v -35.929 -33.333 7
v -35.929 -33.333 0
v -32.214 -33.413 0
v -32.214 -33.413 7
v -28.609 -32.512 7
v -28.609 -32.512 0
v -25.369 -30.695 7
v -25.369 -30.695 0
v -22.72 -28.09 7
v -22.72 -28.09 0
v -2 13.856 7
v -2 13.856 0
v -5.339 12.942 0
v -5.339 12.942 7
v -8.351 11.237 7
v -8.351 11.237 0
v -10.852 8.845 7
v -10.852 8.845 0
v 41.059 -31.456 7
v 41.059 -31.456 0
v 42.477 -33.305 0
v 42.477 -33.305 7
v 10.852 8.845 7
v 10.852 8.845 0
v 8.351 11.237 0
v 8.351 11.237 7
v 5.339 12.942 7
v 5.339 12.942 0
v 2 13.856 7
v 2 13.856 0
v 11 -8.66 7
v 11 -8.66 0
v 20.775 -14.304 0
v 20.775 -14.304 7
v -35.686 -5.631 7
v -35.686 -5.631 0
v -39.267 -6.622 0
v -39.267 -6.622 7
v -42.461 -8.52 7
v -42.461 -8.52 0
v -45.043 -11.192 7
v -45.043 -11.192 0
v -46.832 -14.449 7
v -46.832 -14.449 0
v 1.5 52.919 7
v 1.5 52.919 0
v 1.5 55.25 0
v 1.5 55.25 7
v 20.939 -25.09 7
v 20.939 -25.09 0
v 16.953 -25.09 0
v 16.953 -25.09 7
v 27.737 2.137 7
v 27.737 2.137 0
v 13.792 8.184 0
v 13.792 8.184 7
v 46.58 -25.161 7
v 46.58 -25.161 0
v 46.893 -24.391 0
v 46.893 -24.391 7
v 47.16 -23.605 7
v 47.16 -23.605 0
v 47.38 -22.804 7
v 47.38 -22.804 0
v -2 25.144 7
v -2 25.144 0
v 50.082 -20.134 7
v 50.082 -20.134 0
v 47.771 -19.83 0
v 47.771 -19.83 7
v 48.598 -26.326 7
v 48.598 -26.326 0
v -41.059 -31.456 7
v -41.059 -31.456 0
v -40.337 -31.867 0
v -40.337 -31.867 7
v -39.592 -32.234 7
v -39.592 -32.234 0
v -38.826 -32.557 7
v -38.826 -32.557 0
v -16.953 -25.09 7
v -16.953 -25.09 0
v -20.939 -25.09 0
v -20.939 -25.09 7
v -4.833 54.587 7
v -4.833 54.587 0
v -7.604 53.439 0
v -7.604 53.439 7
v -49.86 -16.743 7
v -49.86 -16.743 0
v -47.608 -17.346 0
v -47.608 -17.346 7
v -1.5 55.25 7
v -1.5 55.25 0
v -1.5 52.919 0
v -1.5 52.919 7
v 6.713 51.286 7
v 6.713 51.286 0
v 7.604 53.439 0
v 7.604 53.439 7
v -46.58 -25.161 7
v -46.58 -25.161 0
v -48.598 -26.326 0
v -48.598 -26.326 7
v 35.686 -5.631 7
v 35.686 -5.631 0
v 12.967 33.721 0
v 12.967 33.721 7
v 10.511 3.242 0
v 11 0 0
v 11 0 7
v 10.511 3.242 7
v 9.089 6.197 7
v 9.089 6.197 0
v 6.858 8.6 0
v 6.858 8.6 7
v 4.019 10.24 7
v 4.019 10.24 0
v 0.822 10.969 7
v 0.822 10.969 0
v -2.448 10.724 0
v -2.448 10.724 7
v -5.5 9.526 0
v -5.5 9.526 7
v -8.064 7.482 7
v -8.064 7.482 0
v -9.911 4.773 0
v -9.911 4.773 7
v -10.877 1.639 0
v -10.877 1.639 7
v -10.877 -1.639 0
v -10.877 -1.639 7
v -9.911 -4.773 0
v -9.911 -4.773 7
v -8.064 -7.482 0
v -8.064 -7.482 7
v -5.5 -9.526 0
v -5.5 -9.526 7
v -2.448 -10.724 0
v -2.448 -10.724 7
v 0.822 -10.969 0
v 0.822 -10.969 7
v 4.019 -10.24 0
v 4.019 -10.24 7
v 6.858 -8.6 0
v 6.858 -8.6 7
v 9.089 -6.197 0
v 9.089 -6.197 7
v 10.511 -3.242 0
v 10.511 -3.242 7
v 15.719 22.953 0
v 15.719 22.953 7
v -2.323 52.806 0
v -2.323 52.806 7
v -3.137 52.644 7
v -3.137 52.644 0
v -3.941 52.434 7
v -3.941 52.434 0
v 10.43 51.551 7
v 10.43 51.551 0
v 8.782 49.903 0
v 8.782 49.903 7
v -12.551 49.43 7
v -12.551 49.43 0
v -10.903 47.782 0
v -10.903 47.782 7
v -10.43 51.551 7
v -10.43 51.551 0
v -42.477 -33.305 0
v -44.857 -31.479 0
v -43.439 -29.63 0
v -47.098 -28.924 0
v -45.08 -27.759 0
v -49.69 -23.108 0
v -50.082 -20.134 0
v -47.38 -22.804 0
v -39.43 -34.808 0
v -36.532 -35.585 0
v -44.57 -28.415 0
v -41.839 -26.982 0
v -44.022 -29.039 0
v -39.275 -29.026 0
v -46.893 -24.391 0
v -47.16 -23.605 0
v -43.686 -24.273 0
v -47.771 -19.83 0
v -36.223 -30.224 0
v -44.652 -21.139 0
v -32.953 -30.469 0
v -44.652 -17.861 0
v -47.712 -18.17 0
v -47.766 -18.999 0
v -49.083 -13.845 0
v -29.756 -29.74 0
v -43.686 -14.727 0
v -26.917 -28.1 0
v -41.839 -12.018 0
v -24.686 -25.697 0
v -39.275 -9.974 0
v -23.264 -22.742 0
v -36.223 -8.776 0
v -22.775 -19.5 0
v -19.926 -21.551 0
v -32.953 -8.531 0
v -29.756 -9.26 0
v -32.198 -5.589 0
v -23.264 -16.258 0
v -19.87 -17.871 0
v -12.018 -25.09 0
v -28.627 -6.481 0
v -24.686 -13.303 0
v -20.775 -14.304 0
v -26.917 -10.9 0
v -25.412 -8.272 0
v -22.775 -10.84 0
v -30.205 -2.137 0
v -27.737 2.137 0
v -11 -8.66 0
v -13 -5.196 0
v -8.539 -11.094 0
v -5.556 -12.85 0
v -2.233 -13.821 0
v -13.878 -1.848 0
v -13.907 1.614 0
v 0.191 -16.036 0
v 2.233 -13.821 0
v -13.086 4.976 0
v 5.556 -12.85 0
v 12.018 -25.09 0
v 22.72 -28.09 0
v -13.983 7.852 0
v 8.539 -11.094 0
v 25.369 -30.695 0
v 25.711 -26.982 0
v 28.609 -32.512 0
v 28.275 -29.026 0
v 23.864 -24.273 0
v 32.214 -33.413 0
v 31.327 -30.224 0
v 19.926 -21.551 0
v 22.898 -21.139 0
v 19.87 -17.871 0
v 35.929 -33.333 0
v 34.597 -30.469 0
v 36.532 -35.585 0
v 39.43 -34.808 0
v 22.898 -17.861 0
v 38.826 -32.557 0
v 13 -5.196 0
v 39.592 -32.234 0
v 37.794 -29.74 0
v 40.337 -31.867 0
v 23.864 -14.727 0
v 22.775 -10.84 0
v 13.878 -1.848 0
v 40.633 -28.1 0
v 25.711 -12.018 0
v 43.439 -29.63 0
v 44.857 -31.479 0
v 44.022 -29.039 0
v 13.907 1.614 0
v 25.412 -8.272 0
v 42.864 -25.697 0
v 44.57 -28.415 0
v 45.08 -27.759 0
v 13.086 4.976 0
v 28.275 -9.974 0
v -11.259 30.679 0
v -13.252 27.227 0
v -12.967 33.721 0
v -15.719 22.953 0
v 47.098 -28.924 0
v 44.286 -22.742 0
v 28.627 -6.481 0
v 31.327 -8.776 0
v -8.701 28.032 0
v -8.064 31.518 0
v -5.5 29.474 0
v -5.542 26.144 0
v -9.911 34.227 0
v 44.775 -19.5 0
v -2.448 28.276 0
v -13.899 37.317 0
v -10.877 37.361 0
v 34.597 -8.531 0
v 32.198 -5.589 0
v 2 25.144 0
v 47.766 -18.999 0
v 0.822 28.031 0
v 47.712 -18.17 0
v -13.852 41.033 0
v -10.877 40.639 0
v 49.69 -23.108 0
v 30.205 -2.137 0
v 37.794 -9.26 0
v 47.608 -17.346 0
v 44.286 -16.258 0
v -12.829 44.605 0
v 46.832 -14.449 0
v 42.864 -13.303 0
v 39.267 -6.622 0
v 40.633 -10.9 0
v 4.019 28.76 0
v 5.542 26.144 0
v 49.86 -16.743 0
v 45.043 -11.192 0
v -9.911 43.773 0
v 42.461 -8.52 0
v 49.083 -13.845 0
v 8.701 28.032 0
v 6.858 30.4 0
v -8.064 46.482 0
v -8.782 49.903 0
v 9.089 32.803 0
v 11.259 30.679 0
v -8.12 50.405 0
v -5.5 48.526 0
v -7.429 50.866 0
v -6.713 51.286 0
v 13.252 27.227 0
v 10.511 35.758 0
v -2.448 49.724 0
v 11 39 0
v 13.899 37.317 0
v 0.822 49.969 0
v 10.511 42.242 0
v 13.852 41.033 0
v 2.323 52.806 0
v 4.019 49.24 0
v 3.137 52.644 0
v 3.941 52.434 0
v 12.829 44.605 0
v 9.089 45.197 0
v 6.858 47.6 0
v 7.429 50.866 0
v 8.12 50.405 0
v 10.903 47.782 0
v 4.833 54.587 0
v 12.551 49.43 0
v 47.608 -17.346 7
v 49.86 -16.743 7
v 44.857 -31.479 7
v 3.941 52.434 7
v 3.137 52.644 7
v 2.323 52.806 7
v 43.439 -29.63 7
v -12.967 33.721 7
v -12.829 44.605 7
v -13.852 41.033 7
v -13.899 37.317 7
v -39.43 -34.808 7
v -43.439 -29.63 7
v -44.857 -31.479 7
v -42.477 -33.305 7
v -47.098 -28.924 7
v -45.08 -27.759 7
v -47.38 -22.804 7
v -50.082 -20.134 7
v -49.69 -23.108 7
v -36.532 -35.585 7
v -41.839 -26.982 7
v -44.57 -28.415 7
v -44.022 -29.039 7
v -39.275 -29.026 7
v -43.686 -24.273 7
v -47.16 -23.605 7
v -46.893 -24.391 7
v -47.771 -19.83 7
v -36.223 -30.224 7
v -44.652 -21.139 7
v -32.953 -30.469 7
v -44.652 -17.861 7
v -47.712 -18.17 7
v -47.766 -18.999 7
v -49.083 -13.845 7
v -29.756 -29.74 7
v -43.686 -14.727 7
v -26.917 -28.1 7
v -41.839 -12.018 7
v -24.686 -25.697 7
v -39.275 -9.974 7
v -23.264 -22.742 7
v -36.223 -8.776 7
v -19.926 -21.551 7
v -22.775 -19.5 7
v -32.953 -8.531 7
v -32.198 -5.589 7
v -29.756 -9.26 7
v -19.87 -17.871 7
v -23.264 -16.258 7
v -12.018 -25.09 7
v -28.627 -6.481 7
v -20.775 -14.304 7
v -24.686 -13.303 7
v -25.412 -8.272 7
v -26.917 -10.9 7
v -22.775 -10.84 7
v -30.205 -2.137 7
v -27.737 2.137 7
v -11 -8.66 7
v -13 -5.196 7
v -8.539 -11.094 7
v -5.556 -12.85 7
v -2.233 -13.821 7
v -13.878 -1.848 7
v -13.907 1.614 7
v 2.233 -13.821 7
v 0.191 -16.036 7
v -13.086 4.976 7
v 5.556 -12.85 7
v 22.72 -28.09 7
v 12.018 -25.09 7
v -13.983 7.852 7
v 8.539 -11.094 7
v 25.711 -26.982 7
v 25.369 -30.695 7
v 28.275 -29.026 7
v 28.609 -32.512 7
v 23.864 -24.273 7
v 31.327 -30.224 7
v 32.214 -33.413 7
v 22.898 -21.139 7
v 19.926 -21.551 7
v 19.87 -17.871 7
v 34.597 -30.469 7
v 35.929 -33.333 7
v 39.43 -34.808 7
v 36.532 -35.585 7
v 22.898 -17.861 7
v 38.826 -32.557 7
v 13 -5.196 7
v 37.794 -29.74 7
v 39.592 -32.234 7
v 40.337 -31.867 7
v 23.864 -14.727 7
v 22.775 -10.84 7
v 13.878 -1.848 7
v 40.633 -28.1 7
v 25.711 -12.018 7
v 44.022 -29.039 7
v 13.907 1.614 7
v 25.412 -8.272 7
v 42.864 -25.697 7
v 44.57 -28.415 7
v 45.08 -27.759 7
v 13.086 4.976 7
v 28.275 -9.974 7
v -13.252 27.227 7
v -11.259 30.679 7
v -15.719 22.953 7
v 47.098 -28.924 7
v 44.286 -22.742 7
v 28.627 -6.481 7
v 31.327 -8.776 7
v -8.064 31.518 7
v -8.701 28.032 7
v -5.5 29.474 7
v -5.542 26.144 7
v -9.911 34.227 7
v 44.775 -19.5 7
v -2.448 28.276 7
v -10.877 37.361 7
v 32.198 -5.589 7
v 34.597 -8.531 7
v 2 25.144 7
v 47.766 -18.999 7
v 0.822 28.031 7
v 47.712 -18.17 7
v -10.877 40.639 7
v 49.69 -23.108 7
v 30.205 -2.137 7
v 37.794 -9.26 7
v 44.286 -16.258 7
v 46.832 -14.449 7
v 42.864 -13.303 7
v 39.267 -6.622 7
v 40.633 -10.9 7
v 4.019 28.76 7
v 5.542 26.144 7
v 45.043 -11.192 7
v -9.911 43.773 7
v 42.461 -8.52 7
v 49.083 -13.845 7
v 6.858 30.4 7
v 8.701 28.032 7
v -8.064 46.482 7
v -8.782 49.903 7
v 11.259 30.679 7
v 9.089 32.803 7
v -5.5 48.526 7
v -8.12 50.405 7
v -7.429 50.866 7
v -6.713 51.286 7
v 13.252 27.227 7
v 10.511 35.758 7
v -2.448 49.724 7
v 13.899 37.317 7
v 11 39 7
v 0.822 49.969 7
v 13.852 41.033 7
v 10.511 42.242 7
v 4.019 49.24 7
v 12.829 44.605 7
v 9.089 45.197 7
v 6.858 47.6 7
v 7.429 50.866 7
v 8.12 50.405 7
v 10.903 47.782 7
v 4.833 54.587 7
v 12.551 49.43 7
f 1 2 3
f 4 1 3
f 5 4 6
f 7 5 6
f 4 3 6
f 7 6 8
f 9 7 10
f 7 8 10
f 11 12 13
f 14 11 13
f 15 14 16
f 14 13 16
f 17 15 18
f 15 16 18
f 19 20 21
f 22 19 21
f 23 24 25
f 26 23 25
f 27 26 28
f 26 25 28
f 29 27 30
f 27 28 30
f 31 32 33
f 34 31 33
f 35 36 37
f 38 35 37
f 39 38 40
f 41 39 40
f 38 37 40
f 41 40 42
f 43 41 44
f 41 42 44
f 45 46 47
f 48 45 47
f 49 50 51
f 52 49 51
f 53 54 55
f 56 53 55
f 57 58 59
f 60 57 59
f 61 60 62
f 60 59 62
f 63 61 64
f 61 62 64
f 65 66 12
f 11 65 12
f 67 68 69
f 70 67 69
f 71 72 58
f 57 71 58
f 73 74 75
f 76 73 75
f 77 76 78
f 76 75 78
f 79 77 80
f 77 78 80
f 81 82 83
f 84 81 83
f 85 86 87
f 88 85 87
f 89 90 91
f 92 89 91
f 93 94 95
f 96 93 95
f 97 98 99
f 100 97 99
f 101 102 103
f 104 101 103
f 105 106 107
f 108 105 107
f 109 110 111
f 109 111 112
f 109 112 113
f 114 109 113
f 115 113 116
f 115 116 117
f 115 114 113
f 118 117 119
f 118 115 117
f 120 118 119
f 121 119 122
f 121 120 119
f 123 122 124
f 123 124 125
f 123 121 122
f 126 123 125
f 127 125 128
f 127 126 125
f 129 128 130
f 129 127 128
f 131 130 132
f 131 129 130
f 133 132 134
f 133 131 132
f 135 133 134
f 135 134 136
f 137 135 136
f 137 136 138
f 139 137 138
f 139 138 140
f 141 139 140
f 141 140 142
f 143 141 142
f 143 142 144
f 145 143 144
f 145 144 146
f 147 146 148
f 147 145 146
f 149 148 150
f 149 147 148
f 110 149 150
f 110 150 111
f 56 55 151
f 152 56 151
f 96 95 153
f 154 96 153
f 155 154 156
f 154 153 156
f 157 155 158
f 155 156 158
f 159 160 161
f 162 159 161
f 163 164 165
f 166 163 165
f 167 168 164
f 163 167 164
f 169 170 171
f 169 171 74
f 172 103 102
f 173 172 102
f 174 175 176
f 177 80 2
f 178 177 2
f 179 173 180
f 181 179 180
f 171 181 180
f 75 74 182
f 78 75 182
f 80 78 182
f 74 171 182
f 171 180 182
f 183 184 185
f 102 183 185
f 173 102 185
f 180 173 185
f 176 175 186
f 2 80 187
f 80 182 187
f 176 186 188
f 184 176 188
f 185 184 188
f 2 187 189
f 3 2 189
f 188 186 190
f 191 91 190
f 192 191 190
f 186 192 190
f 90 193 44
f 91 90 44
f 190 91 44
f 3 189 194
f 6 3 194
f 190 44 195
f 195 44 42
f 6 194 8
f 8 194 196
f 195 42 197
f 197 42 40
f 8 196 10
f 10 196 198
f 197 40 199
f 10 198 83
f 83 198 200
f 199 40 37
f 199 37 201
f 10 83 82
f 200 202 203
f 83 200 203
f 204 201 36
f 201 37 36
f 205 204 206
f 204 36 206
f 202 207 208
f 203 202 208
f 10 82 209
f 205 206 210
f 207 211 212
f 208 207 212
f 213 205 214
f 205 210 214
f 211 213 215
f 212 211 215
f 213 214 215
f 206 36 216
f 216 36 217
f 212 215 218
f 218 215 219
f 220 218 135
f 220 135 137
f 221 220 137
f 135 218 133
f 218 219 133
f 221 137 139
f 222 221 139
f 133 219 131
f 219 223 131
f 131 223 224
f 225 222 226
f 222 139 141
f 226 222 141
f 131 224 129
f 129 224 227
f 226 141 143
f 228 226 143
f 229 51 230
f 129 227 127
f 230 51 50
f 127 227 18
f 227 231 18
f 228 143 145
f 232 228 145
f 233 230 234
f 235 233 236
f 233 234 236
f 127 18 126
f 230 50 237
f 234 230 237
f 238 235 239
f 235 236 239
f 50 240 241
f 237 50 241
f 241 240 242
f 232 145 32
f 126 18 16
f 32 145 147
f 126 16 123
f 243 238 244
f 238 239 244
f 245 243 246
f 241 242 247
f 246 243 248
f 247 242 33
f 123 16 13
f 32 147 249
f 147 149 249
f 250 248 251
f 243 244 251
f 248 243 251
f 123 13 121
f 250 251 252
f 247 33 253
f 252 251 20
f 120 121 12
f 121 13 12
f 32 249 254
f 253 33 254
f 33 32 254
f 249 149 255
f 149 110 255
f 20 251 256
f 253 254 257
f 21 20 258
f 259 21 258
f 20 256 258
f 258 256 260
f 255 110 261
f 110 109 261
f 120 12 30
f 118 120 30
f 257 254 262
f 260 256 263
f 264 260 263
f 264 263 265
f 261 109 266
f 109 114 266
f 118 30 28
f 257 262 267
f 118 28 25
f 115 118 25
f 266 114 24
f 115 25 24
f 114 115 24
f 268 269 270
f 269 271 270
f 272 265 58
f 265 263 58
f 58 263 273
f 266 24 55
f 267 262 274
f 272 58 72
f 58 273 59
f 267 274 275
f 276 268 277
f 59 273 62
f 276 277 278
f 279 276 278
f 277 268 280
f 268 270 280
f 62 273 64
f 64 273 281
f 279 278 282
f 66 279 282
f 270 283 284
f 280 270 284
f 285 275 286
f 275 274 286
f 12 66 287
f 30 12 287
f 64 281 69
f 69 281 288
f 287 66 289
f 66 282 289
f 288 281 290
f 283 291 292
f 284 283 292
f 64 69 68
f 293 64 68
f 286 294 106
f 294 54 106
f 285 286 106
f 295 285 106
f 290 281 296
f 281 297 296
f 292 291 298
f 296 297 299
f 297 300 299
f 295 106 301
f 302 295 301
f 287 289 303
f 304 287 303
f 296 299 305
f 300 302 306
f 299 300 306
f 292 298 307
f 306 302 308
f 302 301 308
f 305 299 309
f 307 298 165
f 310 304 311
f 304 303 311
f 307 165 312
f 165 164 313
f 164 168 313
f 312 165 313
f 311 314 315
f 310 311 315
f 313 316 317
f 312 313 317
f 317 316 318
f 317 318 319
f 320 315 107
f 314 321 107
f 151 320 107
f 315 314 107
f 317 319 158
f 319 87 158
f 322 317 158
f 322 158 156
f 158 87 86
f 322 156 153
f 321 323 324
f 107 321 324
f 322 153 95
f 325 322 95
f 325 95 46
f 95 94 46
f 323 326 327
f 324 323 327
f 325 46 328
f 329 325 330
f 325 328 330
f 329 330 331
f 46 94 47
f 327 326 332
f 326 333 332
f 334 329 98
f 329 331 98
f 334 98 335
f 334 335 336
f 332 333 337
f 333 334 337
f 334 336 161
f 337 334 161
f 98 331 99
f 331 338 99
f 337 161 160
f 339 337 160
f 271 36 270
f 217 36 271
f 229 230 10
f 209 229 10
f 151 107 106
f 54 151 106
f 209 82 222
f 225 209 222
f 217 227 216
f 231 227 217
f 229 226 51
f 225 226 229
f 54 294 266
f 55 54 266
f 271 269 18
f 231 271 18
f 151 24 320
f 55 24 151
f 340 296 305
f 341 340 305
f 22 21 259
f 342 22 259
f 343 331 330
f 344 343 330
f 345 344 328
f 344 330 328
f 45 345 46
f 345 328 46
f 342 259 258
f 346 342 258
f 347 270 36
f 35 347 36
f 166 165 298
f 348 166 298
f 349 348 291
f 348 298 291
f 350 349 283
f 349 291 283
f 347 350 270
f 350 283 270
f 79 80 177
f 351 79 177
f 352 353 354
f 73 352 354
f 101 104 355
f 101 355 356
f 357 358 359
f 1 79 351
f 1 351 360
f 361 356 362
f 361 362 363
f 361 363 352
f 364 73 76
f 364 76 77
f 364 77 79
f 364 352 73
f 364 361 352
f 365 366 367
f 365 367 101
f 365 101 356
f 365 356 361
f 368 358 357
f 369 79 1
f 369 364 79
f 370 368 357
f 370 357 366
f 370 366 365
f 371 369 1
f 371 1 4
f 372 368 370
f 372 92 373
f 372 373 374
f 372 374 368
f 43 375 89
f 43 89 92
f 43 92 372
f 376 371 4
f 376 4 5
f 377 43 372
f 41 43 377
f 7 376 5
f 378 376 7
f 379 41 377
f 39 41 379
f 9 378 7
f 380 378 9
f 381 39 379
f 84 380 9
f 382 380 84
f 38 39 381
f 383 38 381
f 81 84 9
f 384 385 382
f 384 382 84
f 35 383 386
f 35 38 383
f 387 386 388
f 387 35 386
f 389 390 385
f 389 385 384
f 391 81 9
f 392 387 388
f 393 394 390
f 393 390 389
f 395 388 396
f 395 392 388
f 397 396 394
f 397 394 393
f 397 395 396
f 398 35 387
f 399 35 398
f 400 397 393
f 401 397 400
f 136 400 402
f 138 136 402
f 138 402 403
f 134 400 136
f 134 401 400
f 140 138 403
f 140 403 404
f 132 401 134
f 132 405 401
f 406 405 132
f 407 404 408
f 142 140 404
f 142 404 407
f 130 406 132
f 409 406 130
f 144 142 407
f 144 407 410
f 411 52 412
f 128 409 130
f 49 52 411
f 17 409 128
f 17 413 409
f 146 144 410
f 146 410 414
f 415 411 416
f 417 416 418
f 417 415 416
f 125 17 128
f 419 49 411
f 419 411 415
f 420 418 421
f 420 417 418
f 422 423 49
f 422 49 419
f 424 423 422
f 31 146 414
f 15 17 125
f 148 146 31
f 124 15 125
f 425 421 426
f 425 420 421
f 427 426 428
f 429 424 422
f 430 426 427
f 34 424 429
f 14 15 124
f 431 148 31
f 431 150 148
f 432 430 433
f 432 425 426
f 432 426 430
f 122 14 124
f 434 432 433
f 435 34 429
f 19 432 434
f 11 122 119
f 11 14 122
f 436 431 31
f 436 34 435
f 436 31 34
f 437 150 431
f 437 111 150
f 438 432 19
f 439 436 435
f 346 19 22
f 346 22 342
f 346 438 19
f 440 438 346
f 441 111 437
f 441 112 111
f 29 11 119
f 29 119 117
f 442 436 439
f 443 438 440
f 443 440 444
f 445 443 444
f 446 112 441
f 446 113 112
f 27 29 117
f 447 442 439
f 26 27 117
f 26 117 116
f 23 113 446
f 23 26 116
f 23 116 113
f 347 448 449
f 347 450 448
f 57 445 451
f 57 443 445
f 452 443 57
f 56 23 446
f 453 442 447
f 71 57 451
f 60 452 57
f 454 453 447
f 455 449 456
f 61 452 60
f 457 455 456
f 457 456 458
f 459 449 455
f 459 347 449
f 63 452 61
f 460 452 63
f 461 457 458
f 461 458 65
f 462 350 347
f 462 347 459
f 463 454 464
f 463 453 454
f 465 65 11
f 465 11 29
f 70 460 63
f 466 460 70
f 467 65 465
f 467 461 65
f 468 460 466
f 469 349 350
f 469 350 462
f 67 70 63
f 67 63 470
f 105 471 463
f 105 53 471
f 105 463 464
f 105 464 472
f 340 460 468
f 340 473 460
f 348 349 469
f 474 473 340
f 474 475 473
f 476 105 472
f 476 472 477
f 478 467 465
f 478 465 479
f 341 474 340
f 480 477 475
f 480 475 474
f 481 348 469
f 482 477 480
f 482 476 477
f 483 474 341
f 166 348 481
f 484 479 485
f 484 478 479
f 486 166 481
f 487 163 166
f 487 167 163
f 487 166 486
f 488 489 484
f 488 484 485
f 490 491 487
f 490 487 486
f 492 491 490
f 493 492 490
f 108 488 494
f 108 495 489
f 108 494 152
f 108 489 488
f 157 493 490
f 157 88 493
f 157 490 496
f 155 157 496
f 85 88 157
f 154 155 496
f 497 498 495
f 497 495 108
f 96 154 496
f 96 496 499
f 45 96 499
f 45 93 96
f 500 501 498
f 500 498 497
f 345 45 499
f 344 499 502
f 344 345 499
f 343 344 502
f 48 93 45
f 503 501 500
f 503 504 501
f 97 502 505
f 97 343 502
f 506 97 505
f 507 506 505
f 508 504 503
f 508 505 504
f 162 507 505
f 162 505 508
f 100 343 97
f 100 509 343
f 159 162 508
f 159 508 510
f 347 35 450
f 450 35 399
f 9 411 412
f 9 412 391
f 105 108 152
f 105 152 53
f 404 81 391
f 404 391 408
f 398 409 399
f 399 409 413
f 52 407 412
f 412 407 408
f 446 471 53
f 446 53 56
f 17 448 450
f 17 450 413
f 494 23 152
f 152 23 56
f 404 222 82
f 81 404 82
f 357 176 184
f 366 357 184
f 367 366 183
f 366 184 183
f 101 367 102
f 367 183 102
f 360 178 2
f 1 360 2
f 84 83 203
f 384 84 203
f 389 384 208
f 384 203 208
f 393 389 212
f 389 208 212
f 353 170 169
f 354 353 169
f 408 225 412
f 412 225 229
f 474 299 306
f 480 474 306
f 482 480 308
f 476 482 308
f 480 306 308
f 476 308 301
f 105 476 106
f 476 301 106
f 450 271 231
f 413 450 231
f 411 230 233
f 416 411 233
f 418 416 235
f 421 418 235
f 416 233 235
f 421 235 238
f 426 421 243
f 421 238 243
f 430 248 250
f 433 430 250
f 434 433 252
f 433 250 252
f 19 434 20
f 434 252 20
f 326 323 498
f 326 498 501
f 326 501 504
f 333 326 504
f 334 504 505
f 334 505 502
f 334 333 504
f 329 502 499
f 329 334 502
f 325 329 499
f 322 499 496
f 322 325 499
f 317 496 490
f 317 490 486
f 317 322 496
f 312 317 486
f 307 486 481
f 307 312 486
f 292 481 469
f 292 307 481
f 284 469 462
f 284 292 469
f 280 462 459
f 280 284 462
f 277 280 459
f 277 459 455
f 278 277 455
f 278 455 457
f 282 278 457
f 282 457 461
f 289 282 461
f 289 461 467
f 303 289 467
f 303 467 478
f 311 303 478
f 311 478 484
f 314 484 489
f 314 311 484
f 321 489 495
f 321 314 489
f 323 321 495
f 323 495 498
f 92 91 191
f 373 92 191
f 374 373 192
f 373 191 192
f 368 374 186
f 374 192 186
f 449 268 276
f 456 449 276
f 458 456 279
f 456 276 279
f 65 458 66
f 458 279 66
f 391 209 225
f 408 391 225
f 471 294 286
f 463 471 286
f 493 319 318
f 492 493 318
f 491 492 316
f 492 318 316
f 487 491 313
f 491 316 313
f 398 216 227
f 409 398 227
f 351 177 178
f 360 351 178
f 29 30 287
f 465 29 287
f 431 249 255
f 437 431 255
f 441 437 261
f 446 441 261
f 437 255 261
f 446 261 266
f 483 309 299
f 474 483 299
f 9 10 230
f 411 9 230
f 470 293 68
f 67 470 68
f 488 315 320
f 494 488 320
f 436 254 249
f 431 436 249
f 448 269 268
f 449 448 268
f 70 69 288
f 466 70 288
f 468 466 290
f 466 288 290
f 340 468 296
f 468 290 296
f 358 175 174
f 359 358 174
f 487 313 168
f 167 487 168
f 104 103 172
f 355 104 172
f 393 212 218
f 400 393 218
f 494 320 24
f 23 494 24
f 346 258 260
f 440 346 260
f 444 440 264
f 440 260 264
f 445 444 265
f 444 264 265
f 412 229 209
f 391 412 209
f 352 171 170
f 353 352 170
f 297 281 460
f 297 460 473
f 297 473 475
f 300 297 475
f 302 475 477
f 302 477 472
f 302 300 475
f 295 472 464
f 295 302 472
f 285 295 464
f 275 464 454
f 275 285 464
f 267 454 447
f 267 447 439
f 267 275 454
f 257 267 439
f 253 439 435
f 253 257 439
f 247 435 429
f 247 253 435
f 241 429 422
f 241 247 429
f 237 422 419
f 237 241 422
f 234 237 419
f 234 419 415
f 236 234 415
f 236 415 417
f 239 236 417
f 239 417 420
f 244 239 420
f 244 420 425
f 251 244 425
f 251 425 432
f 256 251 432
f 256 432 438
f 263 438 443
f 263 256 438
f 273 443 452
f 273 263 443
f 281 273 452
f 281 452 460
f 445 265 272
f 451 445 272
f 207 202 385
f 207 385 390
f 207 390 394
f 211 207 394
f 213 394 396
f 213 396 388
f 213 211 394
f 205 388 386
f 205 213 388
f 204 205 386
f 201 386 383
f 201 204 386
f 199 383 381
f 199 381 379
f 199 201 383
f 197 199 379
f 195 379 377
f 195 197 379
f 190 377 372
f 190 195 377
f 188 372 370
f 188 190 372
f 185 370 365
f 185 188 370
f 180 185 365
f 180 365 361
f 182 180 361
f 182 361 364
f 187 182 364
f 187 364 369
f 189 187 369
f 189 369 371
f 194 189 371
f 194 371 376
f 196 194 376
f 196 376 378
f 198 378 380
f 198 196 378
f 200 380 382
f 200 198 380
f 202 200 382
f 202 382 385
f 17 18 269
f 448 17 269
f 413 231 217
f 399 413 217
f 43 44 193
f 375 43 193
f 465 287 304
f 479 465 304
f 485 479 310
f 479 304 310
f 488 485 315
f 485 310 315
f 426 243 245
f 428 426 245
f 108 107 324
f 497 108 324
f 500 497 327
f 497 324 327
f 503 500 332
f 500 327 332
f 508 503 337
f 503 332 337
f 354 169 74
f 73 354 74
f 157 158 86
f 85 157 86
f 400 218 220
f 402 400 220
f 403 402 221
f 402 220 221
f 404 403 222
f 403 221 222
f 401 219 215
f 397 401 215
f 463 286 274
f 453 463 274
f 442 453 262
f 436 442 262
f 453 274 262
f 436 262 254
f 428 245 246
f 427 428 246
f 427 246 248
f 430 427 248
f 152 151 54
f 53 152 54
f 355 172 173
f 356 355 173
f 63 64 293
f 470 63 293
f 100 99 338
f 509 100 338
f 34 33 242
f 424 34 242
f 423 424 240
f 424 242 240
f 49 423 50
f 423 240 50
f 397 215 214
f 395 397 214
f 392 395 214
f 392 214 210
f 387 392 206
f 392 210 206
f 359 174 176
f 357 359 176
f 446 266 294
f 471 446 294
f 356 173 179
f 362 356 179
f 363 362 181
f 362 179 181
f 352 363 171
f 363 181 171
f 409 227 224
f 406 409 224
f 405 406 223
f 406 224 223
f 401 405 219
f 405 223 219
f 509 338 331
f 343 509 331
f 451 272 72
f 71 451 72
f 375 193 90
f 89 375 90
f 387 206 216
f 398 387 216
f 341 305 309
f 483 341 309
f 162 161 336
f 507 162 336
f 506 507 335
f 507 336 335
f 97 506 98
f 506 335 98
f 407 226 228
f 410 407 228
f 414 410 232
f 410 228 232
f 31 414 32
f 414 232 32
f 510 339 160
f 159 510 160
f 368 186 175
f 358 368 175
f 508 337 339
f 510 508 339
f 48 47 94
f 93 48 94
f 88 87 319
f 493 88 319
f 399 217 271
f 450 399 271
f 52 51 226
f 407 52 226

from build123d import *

# Parameters (mm, degrees)
F0_R     = 11
F1_DEPTH = 7


with BuildPart() as f1:
    # F0 (on Top) → F1 (new body)
    with BuildSketch(Plane.XY):
        with BuildLine():
            Line((-12.551145, 49.429825), (-10.90317, 47.78185))
            ThreePointArc((-10.90317, 47.78185), (-13.851657, 41.032634), (-12.966522, 33.72086))
            Line((-12.966522, 33.72086), (-35.686383, -5.631093))
            ThreePointArc((-35.686383, -5.631093), (-42.461132, -8.52043), (-46.831881, -14.448503))
            Line((-46.831881, -14.448503), (-49.083057, -13.845302))
            Line((-49.083057, -13.845302), (-49.859514, -16.743079))
            Line((-49.859514, -16.743079), (-47.608338, -17.34628))
            ThreePointArc((-47.608338, -17.34628), (-47.745016, -18.584356), (-47.771108, -19.82968))
            Line((-47.771108, -19.82968), (-50.081759, -20.133883))
            Line((-50.081759, -20.133883), (-49.69018, -23.108218))
            Line((-49.69018, -23.108218), (-47.37953, -22.804015))
            ThreePointArc((-47.37953, -22.804015), (-47.032013, -24.000153), (-46.579554, -25.160667))
            Line((-46.579554, -25.160667), (-48.597904, -26.325962))
            Line((-48.597904, -26.325962), (-47.097904, -28.924038))
            Line((-47.097904, -28.924038), (-45.079554, -27.758744))
            ThreePointArc((-45.079554, -27.758744), (-44.300748, -28.730841), (-43.438621, -29.629869))
            Line((-43.438621, -29.629869), (-44.857394, -31.47885))
            Line((-44.857394, -31.47885), (-42.477334, -33.305134))
            Line((-42.477334, -33.305134), (-41.058561, -31.456153))
            ThreePointArc((-41.058561, -31.456153), (-39.967032, -32.056218), (-38.826488, -32.55689))
            Line((-38.826488, -32.55689), (-39.429689, -34.808066))
            Line((-39.429689, -34.808066), (-36.531911, -35.584523))
            Line((-36.531911, -35.584523), (-35.928711, -33.333347))
            ThreePointArc((-35.928711, -33.333347), (-28.609475, -32.512204), (-22.719861, -28.089767))
            Line((-22.719861, -28.089767), (22.719861, -28.089767))
            ThreePointArc((22.719861, -28.089767), (28.609475, -32.512204), (35.928711, -33.333347))
            Line((35.928711, -33.333347), (36.531911, -35.584523))
            Line((36.531911, -35.584523), (39.429689, -34.808066))
            Line((39.429689, -34.808066), (38.826488, -32.55689))
            ThreePointArc((38.826488, -32.55689), (39.967032, -32.056218), (41.058561, -31.456153))
            Line((41.058561, -31.456153), (42.477334, -33.305134))
            Line((42.477334, -33.305134), (44.857394, -31.47885))
            Line((44.857394, -31.47885), (43.438621, -29.629869))
            ThreePointArc((43.438621, -29.629869), (44.300748, -28.730841), (45.079554, -27.758744))
            Line((45.079554, -27.758744), (47.097904, -28.924038))
            Line((47.097904, -28.924038), (48.597904, -26.325962))
            Line((48.597904, -26.325962), (46.579554, -25.160667))
            ThreePointArc((46.579554, -25.160667), (47.032013, -24.000153), (47.37953, -22.804015))
            Line((47.37953, -22.804015), (49.69018, -23.108218))
            Line((49.69018, -23.108218), (50.081759, -20.133883))
            Line((50.081759, -20.133883), (47.771108, -19.82968))
            ThreePointArc((47.771108, -19.82968), (47.745016, -18.584356), (47.608338, -17.34628))
            Line((47.608338, -17.34628), (49.859514, -16.743079))
            Line((49.859514, -16.743079), (49.083057, -13.845302))
            Line((49.083057, -13.845302), (46.831881, -14.448503))
            ThreePointArc((46.831881, -14.448503), (42.461132, -8.52043), (35.686383, -5.631093))
            Line((35.686383, -5.631093), (12.966522, 33.72086))
            ThreePointArc((12.966522, 33.72086), (13.851657, 41.032634), (10.90317, 47.78185))
            Line((10.90317, 47.78185), (12.551145, 49.429825))
            Line((12.551145, 49.429825), (10.429825, 51.551145))
            Line((10.429825, 51.551145), (8.78185, 49.90317))
            ThreePointArc((8.78185, 49.90317), (7.777983, 50.640575), (6.712547, 51.285834))
            Line((6.712547, 51.285834), (7.604425, 53.439017))
            Line((7.604425, 53.439017), (4.832786, 54.587068))
            Line((4.832786, 54.587068), (3.940909, 52.433884))
            ThreePointArc((3.940909, 52.433884), (2.731265, 52.730994), (1.5, 52.919411))
            Line((1.5, 52.919411), (1.5, 55.25))
            Line((1.5, 55.25), (-1.5, 55.25))
            Line((-1.5, 55.25), (-1.5, 52.919411))
            ThreePointArc((-1.5, 52.919411), (-2.731265, 52.730994), (-3.940909, 52.433884))
            Line((-3.940909, 52.433884), (-4.832786, 54.587068))
            Line((-4.832786, 54.587068), (-7.604425, 53.439017))
            Line((-7.604425, 53.439017), (-6.712547, 51.285834))
            ThreePointArc((-6.712547, 51.285834), (-7.777983, 50.640575), (-8.78185, 49.90317))
            Line((-8.78185, 49.90317), (-10.429825, 51.551145))
            Line((-10.429825, 51.551145), (-12.551145, 49.429825))
        make_face()
        with Locations((-33.774991, -19.5)):
            Circle(F0_R, mode=Mode.SUBTRACT)
        Polygon((-12.018009, -25.089767), (0.191454, -16.03568), (12.018009, -25.089767), align=None, mode=Mode.SUBTRACT)
        with BuildLine():
            Line((-20.774991, -14.303848), (-11, -8.660254))
            ThreePointArc((-11, -8.660254), (-7.101984, -12.0649), (-2.233383, -13.820709))
            Line((-2.233383, -13.820709), (-16.953159, -25.089767))
            Line((-16.953159, -25.089767), (-20.939318, -25.089767))
            ThreePointArc((-20.939318, -25.089767), (-19.776615, -19.71327), (-20.774991, -14.303848))
        make_face(mode=Mode.SUBTRACT)
        with BuildLine():
            ThreePointArc((-13.085777, 4.976188), (-13.999502, -0.118049), (-13, -5.196152))
            Line((-13, -5.196152), (-22.774991, -10.839746))
            ThreePointArc((-22.774991, -10.839746), (-26.9605, -7.270416), (-32.198035, -5.589097))
            Line((-32.198035, -5.589097), (-30.204955, -2.136982))
            Line((-30.204955, -2.136982), (-13.085777, 4.976188))
        make_face(mode=Mode.SUBTRACT)
        with BuildLine():
            ThreePointArc((2.233383, -13.820709), (7.101984, -12.0649), (11, -8.660254))
            Line((11, -8.660254), (20.774991, -14.303848))
            ThreePointArc((20.774991, -14.303848), (19.776615, -19.71327), (20.939318, -25.089767))
            Line((20.939318, -25.089767), (16.953159, -25.089767))
            Line((16.953159, -25.089767), (2.233383, -13.820709))
        make_face(mode=Mode.SUBTRACT)
        with Locations((33.774991, -19.5)):
            Circle(F0_R, mode=Mode.SUBTRACT)
        with BuildLine():
            Line((22.774991, -10.839746), (13, -5.196152))
            ThreePointArc((13, -5.196152), (13.999502, -0.118049), (13.085777, 4.976188))
            Line((13.085777, 4.976188), (30.204955, -2.136982))
            Line((30.204955, -2.136982), (32.198035, -5.589097))
            ThreePointArc((32.198035, -5.589097), (26.9605, -7.270416), (22.774991, -10.839746))
        make_face(mode=Mode.SUBTRACT)
        Circle(F0_R, mode=Mode.SUBTRACT)
        Polygon((-15.719371, 22.952785), (-13.983033, 7.852036), (-27.73738, 2.136982), align=None, mode=Mode.SUBTRACT)
        with BuildLine():
            Line((-2, 25.143594), (-2, 13.856406))
            ThreePointArc((-2, 13.856406), (-6.897518, 12.182949), (-10.852394, 8.844521))
            Line((-10.852394, 8.844521), (-13.251797, 27.22675))
            Line((-13.251797, 27.22675), (-11.258717, 30.678865))
            ThreePointArc((-11.258717, 30.678865), (-7.183885, 26.983686), (-2, 25.143594))
        make_face(mode=Mode.SUBTRACT)
        with BuildLine():
            ThreePointArc((10.852394, 8.844521), (6.897518, 12.182949), (2, 13.856406))
            Line((2, 13.856406), (2, 25.143594))
            ThreePointArc((2, 25.143594), (7.183885, 26.983686), (11.258717, 30.678865))
            Line((11.258717, 30.678865), (13.251797, 27.22675))
            Line((13.251797, 27.22675), (10.852394, 8.844521))
        make_face(mode=Mode.SUBTRACT)
        Polygon((27.73738, 2.136982), (13.791579, 8.183644), (15.719371, 22.952785), align=None, mode=Mode.SUBTRACT)
        with Locations((0, 39)):
            Circle(F0_R, mode=Mode.SUBTRACT)
    extrude(amount=F1_DEPTH)


solid = f1.part
